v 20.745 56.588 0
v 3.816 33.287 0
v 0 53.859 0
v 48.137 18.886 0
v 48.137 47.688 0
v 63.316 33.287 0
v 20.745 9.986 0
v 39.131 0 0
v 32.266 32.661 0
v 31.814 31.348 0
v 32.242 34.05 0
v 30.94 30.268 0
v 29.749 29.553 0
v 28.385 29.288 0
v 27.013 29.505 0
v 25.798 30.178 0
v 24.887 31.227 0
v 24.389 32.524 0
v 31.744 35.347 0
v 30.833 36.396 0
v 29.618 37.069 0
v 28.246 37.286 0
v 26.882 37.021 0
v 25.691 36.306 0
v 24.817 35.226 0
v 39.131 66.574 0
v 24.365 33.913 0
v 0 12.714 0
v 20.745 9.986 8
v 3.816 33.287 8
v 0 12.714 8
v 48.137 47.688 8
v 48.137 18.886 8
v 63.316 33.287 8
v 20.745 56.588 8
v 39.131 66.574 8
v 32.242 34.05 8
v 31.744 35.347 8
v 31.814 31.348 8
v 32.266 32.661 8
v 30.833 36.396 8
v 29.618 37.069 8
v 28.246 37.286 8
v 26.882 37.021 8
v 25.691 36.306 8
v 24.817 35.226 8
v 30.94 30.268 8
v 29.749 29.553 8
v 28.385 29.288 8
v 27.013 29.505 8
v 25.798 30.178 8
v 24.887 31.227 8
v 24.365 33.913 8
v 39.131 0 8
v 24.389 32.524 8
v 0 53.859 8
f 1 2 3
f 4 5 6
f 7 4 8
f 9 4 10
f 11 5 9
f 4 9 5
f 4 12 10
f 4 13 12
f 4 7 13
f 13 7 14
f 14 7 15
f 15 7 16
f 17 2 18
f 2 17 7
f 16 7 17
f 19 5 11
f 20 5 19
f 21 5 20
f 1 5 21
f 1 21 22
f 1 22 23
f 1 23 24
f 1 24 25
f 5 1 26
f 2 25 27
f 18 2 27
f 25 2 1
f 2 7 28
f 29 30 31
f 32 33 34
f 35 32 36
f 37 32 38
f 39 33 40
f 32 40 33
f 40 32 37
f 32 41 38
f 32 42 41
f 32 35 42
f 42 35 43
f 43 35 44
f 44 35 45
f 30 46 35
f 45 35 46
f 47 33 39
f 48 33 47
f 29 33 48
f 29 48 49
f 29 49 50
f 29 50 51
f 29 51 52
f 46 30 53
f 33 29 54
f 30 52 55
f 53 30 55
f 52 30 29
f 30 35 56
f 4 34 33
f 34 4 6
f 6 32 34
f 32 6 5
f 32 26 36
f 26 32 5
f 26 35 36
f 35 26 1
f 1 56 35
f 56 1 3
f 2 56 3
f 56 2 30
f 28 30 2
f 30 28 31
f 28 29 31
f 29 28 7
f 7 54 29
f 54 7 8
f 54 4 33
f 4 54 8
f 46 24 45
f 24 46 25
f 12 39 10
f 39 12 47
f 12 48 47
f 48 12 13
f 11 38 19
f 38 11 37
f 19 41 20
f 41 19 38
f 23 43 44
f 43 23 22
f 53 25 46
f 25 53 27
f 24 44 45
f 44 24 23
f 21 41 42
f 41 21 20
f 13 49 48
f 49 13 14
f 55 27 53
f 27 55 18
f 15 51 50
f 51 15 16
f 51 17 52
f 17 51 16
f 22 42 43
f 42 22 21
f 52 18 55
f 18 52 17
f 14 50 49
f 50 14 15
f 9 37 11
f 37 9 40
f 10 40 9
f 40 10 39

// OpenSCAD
$fn = 32;

// ----------------------------------------------------------------------
// Star wheel: 5-point blunt, R35
// ----------------------------------------------------------------------

// --- parameters (mm) ---
n_points = 5;             // number of points / teeth
r_out = 35;               // tip radius
r_in = 24.5;              // root radius
bore_r = 4;               // centre bore radius
plate_t = 8;              // plate thickness, Z (extrusion height)
bore_d = 8;               // centre bore diameter

profile = [[63.316, 33.287], [48.137, 47.688], [39.131, 66.574], [20.745, 56.588], [0, 53.859], [3.816, 33.287], [0, 12.714], [20.745, 9.986], [39.131, 0], [48.137, 18.886]];  // primary outline, 10 points, counter clockwise
void_1 = [[32.242, 34.05], [31.744, 35.347], [30.833, 36.396], [29.618, 37.069], [28.246, 37.286], [26.882, 37.021], [25.691, 36.306], [24.817, 35.226], [24.365, 33.913], [24.389, 32.524], [24.887, 31.227], [25.798, 30.178], [27.013, 29.505], [28.385, 29.288], [29.749, 29.553], [30.94, 30.268], [31.814, 31.348], [32.266, 32.661]];  // centre bore, 18 points

// --- the one profile operation ---
difference() {
  linear_extrude(height = plate_t) polygon(points = profile);
  translate([0, 0, -1])
    linear_extrude(height = plate_t + 2) polygon(points = void_1);
}
